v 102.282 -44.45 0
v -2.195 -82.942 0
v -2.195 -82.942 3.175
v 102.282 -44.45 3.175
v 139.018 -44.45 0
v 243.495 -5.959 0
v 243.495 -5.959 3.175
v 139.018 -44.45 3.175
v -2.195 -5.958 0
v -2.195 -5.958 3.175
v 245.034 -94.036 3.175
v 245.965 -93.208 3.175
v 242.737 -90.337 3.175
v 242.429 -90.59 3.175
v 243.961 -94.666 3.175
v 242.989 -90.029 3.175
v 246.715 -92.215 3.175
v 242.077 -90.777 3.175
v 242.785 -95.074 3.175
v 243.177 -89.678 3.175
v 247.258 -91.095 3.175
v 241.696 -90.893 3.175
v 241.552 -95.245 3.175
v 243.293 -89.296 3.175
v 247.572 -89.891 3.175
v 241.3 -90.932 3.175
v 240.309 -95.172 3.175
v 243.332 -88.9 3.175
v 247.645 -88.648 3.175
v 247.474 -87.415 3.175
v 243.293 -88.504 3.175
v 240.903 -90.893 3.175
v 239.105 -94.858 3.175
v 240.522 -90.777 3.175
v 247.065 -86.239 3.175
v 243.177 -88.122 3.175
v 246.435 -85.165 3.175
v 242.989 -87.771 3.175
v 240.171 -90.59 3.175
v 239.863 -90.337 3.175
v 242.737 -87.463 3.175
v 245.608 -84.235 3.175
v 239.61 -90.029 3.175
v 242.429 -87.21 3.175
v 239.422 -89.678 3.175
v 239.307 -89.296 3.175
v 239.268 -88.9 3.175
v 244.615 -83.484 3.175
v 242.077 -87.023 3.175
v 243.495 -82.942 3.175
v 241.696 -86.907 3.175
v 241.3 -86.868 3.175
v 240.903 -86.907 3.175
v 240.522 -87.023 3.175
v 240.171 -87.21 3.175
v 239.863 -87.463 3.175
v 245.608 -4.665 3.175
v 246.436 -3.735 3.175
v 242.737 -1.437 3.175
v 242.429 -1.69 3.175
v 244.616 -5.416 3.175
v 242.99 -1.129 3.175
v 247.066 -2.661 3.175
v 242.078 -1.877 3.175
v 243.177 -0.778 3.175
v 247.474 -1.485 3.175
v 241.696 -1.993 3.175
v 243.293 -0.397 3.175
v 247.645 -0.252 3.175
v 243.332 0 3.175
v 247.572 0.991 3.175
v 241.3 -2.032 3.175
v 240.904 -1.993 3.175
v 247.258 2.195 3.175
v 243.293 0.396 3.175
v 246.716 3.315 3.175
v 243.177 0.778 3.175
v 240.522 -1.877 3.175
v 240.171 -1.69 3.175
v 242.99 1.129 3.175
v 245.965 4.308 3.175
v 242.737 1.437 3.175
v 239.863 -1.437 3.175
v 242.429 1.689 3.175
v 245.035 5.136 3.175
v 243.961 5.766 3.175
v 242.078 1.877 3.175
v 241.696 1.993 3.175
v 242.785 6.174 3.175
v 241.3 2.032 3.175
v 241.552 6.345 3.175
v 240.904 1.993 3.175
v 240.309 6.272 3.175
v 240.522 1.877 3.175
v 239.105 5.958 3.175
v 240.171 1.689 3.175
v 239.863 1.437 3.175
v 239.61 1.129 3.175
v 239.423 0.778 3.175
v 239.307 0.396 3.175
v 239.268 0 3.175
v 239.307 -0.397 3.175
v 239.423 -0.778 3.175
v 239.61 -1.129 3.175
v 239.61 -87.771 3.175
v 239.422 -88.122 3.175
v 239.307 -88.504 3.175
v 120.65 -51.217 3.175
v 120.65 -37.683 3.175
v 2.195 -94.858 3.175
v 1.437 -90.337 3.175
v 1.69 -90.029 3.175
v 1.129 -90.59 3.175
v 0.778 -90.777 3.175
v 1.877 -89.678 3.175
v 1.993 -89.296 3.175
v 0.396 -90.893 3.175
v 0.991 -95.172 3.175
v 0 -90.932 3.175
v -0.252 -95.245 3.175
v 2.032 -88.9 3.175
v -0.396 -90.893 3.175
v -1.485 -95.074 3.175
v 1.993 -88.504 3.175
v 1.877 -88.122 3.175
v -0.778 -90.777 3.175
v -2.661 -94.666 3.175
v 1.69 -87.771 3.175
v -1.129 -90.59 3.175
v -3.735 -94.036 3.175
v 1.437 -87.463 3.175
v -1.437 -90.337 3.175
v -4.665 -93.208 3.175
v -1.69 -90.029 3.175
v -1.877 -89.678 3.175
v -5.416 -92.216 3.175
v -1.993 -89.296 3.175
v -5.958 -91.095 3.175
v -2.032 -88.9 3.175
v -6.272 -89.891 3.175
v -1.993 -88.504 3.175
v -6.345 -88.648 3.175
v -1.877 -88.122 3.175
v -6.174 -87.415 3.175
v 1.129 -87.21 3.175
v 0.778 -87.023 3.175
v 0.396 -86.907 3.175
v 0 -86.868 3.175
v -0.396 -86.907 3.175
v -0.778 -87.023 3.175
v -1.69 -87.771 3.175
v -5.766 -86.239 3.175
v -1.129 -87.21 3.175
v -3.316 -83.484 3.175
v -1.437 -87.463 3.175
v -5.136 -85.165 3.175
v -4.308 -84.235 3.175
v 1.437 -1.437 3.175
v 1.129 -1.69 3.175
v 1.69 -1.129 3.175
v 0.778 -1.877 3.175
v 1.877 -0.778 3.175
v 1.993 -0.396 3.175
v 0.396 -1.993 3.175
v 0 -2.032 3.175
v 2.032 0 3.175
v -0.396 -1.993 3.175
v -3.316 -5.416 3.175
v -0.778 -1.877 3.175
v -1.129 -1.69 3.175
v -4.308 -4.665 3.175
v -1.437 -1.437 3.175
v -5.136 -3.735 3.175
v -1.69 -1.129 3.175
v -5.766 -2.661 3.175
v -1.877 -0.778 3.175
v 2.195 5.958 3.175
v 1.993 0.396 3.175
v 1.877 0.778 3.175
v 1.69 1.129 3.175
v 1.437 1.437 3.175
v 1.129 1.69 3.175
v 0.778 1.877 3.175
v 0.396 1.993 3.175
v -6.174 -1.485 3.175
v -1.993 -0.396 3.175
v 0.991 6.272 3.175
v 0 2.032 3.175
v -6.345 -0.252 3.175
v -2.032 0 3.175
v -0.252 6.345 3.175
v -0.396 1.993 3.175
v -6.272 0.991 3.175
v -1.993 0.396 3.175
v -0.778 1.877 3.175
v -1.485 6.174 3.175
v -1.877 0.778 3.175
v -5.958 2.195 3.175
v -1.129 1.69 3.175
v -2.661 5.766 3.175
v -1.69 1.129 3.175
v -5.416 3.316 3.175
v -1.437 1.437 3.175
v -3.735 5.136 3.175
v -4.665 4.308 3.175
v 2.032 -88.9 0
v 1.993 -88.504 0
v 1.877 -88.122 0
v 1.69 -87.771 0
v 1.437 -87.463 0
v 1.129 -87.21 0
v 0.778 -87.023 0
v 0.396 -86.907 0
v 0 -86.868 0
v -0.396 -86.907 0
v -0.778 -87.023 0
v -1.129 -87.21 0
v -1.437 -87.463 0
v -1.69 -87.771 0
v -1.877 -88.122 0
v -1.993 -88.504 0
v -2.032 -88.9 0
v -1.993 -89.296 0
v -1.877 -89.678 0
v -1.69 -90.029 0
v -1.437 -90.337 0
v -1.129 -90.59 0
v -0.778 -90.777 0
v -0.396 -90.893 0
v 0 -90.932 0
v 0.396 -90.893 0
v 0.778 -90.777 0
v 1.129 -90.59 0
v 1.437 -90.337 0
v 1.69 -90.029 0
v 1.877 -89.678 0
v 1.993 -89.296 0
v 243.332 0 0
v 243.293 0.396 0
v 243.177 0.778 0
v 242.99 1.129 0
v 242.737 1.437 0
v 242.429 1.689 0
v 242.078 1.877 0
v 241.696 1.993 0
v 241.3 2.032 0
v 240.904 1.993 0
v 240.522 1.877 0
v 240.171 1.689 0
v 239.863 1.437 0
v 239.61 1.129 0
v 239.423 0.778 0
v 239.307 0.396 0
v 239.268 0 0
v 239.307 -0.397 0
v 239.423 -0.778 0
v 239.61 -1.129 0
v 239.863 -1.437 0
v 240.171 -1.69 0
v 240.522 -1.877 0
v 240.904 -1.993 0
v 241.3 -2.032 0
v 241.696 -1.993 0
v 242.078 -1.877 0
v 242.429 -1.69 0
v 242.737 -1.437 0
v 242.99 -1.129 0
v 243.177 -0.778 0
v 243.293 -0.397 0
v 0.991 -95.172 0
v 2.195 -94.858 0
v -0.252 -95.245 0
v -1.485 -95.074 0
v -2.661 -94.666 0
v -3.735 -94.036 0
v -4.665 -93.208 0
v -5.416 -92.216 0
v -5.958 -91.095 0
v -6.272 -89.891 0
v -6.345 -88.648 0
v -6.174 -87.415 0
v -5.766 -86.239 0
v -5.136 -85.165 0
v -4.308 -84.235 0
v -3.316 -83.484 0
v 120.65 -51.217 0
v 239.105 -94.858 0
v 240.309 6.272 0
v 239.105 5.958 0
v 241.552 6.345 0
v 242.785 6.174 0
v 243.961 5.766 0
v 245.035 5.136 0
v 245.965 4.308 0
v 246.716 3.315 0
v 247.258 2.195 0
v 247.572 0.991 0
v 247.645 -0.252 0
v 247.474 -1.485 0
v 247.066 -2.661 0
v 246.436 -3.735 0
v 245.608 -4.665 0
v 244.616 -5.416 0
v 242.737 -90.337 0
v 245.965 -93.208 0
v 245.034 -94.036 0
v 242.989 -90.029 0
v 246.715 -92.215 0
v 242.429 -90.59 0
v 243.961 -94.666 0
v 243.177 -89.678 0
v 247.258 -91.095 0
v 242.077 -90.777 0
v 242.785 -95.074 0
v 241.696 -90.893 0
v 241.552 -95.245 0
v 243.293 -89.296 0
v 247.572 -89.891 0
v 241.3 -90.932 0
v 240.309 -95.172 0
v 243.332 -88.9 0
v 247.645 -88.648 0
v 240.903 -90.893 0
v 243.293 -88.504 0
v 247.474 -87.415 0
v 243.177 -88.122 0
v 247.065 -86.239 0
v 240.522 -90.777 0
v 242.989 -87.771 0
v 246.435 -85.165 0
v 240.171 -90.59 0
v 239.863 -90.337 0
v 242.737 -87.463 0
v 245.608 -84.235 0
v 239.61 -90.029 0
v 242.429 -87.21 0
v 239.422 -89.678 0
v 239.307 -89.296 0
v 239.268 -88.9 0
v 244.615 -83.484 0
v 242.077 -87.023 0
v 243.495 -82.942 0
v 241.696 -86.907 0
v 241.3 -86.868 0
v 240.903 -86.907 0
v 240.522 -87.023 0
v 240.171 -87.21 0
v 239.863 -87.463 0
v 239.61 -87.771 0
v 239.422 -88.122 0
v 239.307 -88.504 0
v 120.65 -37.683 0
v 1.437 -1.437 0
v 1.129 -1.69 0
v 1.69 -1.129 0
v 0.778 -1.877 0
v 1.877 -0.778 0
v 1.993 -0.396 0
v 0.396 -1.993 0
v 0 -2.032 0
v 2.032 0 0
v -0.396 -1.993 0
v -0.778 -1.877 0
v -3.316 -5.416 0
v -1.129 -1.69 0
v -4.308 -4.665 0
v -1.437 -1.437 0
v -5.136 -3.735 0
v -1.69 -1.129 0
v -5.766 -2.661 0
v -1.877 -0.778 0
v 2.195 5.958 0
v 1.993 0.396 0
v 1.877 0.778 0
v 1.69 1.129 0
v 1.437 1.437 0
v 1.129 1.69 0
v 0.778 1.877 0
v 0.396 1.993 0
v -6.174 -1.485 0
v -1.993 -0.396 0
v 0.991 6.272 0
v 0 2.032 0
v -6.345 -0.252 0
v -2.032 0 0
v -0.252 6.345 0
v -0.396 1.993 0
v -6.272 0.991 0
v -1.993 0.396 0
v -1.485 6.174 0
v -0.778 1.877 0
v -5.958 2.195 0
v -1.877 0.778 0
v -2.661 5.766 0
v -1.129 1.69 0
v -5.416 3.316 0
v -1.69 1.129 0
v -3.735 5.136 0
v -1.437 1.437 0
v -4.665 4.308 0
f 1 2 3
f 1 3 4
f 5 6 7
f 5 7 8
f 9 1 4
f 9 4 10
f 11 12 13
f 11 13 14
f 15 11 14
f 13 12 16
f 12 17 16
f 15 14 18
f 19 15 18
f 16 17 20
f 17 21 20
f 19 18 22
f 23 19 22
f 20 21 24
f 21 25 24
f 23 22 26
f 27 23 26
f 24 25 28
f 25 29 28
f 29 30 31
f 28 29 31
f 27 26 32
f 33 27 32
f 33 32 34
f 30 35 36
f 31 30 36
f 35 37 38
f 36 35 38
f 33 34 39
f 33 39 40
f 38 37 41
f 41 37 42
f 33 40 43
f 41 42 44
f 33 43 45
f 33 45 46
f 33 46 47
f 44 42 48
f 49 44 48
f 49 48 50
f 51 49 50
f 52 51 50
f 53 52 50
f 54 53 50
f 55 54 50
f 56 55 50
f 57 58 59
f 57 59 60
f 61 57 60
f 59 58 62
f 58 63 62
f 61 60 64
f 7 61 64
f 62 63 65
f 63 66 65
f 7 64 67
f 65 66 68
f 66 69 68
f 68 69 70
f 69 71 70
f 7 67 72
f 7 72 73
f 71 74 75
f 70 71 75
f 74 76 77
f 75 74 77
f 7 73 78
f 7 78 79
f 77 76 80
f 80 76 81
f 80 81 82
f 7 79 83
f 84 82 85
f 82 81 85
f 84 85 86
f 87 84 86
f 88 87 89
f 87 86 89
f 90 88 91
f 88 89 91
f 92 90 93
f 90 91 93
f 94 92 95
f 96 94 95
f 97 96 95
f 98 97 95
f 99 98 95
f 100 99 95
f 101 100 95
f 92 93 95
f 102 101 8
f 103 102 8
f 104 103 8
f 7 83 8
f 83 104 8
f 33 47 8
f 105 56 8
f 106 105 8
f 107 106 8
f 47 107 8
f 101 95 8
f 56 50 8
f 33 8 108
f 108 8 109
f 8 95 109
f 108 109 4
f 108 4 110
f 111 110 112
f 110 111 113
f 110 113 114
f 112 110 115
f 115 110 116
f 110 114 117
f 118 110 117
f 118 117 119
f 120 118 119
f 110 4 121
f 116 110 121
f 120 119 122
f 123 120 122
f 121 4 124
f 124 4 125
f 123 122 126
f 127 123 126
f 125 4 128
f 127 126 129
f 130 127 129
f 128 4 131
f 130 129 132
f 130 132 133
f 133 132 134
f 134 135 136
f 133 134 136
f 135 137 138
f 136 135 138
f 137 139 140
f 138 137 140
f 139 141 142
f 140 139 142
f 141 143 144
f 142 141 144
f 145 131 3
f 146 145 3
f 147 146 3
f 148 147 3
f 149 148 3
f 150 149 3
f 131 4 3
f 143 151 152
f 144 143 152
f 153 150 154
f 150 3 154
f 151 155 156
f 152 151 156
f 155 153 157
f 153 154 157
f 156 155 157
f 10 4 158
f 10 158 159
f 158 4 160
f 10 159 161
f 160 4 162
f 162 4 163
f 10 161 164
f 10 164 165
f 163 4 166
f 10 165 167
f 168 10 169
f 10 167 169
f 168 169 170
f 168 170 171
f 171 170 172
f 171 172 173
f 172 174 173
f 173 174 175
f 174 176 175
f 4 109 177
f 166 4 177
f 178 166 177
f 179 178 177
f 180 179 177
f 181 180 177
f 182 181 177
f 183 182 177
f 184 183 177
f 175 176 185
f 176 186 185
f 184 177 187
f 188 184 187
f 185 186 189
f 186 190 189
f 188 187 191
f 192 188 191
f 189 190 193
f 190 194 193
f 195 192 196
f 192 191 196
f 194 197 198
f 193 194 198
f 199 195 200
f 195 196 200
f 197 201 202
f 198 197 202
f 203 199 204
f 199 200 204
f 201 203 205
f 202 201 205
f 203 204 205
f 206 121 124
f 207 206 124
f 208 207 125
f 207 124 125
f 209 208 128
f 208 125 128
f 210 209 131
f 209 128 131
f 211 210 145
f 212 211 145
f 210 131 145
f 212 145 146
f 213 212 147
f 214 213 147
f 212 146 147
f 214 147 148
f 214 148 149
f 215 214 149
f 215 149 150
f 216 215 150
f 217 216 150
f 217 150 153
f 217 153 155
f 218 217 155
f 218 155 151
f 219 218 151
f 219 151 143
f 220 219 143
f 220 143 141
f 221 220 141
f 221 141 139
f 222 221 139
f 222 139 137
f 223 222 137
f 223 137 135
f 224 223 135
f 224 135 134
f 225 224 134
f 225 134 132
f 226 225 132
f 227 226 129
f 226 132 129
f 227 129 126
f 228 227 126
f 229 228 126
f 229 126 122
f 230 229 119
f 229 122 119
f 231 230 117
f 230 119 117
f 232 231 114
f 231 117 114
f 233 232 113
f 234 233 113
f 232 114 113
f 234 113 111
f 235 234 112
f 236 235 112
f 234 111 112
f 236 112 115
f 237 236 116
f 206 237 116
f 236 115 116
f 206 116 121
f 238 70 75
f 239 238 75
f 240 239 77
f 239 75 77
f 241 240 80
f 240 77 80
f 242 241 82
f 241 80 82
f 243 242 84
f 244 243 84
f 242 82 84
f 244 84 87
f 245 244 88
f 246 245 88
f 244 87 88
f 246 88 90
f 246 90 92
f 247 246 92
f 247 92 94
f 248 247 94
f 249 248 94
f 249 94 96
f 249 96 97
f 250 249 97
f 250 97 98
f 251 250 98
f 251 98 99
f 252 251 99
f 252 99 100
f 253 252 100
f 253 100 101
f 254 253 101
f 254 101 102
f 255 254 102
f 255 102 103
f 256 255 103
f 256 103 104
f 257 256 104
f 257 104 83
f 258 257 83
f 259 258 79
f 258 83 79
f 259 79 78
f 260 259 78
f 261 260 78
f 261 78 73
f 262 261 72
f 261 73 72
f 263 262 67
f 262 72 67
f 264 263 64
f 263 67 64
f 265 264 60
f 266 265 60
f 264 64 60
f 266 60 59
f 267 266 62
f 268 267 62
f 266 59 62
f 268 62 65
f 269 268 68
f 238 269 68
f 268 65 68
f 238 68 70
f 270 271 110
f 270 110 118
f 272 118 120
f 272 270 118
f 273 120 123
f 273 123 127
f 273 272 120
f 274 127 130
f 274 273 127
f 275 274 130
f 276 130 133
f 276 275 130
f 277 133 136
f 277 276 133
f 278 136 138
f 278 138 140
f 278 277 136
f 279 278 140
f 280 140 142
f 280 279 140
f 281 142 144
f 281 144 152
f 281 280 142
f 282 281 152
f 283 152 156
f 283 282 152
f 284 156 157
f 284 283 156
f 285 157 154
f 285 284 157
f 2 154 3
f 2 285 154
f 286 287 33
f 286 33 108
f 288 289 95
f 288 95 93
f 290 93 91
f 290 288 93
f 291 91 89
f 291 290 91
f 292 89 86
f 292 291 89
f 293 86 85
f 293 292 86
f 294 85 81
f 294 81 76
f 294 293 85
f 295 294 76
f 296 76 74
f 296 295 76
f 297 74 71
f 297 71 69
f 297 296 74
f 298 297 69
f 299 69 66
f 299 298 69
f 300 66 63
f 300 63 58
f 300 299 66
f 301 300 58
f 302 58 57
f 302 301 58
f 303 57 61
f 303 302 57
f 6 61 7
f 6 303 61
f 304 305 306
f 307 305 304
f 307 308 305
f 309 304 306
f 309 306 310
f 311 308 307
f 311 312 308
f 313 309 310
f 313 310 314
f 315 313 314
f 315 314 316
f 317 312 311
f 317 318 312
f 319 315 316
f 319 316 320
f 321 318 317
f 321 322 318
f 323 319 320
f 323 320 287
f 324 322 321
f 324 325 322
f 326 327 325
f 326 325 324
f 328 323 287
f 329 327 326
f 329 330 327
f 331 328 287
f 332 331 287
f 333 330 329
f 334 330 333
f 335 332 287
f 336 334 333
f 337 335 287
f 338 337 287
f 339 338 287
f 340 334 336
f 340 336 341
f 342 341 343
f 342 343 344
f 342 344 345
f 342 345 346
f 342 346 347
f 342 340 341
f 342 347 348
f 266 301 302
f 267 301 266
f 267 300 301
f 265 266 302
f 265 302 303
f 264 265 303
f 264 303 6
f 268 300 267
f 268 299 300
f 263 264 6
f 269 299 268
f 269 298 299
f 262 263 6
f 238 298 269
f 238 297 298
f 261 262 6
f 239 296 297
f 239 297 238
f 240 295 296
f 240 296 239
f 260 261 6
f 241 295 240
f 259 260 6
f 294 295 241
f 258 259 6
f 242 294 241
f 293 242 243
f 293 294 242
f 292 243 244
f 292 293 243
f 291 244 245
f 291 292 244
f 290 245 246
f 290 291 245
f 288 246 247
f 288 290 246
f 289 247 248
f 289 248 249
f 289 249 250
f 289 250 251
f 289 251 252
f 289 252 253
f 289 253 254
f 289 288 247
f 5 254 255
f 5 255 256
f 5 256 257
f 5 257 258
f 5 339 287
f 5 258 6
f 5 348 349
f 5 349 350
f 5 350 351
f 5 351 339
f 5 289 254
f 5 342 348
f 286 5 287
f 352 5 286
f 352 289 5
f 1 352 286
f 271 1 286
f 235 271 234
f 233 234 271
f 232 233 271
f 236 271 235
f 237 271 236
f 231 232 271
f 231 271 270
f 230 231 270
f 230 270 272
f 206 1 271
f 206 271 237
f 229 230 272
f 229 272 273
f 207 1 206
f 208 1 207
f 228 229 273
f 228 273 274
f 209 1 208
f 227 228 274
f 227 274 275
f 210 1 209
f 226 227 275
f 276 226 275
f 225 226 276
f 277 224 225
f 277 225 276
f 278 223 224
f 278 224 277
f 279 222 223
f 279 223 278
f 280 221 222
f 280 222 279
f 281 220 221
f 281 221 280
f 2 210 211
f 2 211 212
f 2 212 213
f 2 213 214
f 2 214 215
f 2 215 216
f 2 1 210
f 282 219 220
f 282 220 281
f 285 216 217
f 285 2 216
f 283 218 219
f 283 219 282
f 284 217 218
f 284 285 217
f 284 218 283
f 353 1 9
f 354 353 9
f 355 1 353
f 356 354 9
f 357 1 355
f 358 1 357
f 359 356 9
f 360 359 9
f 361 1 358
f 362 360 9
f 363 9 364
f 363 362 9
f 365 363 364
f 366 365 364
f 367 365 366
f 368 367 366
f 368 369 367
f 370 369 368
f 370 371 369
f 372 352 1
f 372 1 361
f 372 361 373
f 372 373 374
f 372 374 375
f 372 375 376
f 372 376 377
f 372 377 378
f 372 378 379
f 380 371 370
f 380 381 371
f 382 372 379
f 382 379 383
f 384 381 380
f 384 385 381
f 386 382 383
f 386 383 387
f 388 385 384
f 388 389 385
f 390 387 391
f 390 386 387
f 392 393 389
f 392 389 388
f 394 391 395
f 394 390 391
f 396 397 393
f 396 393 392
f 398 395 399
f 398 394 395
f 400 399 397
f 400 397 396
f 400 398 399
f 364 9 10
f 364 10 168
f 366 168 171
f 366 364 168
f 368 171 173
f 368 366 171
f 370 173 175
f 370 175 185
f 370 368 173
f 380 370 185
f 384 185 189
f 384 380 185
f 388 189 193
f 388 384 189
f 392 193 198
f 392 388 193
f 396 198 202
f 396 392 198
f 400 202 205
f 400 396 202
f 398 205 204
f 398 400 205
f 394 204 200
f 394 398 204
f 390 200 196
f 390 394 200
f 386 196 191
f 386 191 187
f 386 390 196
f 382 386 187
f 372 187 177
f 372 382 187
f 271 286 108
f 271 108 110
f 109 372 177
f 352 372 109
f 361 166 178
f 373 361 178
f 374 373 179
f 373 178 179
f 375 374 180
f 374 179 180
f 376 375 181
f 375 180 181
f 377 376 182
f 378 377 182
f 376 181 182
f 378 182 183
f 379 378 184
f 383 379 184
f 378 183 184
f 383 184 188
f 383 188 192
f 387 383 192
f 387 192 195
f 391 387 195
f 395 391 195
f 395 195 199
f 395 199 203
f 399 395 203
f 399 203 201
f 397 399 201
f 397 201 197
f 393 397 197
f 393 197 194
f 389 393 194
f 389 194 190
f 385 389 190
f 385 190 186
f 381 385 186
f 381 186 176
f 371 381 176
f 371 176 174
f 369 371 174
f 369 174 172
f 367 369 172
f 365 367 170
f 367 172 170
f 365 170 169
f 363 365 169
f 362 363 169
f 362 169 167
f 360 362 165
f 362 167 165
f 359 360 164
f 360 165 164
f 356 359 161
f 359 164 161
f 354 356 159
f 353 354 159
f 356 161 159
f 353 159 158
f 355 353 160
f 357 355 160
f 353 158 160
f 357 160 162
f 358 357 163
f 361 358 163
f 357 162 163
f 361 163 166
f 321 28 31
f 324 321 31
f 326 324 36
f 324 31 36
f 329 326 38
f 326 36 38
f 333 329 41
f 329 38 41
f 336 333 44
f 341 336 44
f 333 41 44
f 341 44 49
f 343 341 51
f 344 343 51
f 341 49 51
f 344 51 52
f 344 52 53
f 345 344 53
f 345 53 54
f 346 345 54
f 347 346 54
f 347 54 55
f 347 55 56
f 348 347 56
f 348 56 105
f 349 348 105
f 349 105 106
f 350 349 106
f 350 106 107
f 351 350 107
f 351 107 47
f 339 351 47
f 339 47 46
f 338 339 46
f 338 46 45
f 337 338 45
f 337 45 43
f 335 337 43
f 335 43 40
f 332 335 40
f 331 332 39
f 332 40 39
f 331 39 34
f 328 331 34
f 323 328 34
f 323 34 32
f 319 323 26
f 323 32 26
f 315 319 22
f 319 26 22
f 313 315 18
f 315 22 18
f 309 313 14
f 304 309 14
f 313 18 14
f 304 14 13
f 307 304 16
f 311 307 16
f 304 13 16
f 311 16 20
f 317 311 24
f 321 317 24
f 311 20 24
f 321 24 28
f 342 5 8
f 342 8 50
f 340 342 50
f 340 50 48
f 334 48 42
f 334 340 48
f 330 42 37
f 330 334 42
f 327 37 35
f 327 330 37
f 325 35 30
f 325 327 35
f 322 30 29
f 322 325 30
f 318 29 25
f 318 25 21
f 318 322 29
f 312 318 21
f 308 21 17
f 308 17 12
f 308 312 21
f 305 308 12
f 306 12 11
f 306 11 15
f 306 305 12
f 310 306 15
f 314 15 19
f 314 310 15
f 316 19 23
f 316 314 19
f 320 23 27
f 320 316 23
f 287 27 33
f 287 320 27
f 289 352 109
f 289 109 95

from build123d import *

# Parameters (mm, degrees)
BOSS_EXTRUDE1_DEPTH = 3.175
SKETCH2_R           = 2.032
CUT_EXTRUDE1_DEPTH  = 266.354791982


with BuildPart() as part:
    # Sketch1 → Boss-Extrude1 (new body)
    with BuildSketch(Plane.XY):
        with BuildLine():
            Line((-2.195226767, -82.94152037), (102.281759292, -44.45004426))
            Line((102.281759292, -44.45004426), (-2.195231212, -5.958477994))
            ThreePointArc((-2.195231212, -5.958477994), (-5.95843062, 2.195359776), (2.195488341, 5.958383249))
            Line((2.195488341, 5.958383249), (120.650005048, -37.682803747))
            Line((120.650005048, -37.682803747), (239.104554312, 5.958294883))
            ThreePointArc((239.104554312, 5.958294883), (247.258439301, 2.195232145), (243.495226767, -5.958583713))
            Line((243.495226767, -5.958583713), (139.018245757, -44.450057963))
            Line((139.018245757, -44.450057963), (243.494958814, -82.941522012))
            ThreePointArc((243.494958814, -82.941522012), (247.258209334, -91.095221053), (239.104516708, -94.858485472))
            Line((239.104516708, -94.858485472), (120.65, -51.217298476))
            Line((120.65, -51.217298476), (2.195450736, -94.858397105))
            ThreePointArc((2.195450736, -94.858397105), (-5.958438371, -91.095338753), (-2.195226767, -82.94152037))
        make_face()
    extrude(amount=BOSS_EXTRUDE1_DEPTH)

    # Sketch2 → Cut-Extrude1 (cut, through all)
    with BuildSketch(Plane.XY.offset(3.175)):
        Circle(SKETCH2_R)
        with Locations((0, -88.9)):
            Circle(SKETCH2_R)
        with Locations((241.299727604, -88.9)):
            Circle(SKETCH2_R)
        with Locations((241.3, -0.000104083)):
            Circle(SKETCH2_R)
    extrude(amount=-CUT_EXTRUDE1_DEPTH, mode=Mode.SUBTRACT)


solid = part.part
